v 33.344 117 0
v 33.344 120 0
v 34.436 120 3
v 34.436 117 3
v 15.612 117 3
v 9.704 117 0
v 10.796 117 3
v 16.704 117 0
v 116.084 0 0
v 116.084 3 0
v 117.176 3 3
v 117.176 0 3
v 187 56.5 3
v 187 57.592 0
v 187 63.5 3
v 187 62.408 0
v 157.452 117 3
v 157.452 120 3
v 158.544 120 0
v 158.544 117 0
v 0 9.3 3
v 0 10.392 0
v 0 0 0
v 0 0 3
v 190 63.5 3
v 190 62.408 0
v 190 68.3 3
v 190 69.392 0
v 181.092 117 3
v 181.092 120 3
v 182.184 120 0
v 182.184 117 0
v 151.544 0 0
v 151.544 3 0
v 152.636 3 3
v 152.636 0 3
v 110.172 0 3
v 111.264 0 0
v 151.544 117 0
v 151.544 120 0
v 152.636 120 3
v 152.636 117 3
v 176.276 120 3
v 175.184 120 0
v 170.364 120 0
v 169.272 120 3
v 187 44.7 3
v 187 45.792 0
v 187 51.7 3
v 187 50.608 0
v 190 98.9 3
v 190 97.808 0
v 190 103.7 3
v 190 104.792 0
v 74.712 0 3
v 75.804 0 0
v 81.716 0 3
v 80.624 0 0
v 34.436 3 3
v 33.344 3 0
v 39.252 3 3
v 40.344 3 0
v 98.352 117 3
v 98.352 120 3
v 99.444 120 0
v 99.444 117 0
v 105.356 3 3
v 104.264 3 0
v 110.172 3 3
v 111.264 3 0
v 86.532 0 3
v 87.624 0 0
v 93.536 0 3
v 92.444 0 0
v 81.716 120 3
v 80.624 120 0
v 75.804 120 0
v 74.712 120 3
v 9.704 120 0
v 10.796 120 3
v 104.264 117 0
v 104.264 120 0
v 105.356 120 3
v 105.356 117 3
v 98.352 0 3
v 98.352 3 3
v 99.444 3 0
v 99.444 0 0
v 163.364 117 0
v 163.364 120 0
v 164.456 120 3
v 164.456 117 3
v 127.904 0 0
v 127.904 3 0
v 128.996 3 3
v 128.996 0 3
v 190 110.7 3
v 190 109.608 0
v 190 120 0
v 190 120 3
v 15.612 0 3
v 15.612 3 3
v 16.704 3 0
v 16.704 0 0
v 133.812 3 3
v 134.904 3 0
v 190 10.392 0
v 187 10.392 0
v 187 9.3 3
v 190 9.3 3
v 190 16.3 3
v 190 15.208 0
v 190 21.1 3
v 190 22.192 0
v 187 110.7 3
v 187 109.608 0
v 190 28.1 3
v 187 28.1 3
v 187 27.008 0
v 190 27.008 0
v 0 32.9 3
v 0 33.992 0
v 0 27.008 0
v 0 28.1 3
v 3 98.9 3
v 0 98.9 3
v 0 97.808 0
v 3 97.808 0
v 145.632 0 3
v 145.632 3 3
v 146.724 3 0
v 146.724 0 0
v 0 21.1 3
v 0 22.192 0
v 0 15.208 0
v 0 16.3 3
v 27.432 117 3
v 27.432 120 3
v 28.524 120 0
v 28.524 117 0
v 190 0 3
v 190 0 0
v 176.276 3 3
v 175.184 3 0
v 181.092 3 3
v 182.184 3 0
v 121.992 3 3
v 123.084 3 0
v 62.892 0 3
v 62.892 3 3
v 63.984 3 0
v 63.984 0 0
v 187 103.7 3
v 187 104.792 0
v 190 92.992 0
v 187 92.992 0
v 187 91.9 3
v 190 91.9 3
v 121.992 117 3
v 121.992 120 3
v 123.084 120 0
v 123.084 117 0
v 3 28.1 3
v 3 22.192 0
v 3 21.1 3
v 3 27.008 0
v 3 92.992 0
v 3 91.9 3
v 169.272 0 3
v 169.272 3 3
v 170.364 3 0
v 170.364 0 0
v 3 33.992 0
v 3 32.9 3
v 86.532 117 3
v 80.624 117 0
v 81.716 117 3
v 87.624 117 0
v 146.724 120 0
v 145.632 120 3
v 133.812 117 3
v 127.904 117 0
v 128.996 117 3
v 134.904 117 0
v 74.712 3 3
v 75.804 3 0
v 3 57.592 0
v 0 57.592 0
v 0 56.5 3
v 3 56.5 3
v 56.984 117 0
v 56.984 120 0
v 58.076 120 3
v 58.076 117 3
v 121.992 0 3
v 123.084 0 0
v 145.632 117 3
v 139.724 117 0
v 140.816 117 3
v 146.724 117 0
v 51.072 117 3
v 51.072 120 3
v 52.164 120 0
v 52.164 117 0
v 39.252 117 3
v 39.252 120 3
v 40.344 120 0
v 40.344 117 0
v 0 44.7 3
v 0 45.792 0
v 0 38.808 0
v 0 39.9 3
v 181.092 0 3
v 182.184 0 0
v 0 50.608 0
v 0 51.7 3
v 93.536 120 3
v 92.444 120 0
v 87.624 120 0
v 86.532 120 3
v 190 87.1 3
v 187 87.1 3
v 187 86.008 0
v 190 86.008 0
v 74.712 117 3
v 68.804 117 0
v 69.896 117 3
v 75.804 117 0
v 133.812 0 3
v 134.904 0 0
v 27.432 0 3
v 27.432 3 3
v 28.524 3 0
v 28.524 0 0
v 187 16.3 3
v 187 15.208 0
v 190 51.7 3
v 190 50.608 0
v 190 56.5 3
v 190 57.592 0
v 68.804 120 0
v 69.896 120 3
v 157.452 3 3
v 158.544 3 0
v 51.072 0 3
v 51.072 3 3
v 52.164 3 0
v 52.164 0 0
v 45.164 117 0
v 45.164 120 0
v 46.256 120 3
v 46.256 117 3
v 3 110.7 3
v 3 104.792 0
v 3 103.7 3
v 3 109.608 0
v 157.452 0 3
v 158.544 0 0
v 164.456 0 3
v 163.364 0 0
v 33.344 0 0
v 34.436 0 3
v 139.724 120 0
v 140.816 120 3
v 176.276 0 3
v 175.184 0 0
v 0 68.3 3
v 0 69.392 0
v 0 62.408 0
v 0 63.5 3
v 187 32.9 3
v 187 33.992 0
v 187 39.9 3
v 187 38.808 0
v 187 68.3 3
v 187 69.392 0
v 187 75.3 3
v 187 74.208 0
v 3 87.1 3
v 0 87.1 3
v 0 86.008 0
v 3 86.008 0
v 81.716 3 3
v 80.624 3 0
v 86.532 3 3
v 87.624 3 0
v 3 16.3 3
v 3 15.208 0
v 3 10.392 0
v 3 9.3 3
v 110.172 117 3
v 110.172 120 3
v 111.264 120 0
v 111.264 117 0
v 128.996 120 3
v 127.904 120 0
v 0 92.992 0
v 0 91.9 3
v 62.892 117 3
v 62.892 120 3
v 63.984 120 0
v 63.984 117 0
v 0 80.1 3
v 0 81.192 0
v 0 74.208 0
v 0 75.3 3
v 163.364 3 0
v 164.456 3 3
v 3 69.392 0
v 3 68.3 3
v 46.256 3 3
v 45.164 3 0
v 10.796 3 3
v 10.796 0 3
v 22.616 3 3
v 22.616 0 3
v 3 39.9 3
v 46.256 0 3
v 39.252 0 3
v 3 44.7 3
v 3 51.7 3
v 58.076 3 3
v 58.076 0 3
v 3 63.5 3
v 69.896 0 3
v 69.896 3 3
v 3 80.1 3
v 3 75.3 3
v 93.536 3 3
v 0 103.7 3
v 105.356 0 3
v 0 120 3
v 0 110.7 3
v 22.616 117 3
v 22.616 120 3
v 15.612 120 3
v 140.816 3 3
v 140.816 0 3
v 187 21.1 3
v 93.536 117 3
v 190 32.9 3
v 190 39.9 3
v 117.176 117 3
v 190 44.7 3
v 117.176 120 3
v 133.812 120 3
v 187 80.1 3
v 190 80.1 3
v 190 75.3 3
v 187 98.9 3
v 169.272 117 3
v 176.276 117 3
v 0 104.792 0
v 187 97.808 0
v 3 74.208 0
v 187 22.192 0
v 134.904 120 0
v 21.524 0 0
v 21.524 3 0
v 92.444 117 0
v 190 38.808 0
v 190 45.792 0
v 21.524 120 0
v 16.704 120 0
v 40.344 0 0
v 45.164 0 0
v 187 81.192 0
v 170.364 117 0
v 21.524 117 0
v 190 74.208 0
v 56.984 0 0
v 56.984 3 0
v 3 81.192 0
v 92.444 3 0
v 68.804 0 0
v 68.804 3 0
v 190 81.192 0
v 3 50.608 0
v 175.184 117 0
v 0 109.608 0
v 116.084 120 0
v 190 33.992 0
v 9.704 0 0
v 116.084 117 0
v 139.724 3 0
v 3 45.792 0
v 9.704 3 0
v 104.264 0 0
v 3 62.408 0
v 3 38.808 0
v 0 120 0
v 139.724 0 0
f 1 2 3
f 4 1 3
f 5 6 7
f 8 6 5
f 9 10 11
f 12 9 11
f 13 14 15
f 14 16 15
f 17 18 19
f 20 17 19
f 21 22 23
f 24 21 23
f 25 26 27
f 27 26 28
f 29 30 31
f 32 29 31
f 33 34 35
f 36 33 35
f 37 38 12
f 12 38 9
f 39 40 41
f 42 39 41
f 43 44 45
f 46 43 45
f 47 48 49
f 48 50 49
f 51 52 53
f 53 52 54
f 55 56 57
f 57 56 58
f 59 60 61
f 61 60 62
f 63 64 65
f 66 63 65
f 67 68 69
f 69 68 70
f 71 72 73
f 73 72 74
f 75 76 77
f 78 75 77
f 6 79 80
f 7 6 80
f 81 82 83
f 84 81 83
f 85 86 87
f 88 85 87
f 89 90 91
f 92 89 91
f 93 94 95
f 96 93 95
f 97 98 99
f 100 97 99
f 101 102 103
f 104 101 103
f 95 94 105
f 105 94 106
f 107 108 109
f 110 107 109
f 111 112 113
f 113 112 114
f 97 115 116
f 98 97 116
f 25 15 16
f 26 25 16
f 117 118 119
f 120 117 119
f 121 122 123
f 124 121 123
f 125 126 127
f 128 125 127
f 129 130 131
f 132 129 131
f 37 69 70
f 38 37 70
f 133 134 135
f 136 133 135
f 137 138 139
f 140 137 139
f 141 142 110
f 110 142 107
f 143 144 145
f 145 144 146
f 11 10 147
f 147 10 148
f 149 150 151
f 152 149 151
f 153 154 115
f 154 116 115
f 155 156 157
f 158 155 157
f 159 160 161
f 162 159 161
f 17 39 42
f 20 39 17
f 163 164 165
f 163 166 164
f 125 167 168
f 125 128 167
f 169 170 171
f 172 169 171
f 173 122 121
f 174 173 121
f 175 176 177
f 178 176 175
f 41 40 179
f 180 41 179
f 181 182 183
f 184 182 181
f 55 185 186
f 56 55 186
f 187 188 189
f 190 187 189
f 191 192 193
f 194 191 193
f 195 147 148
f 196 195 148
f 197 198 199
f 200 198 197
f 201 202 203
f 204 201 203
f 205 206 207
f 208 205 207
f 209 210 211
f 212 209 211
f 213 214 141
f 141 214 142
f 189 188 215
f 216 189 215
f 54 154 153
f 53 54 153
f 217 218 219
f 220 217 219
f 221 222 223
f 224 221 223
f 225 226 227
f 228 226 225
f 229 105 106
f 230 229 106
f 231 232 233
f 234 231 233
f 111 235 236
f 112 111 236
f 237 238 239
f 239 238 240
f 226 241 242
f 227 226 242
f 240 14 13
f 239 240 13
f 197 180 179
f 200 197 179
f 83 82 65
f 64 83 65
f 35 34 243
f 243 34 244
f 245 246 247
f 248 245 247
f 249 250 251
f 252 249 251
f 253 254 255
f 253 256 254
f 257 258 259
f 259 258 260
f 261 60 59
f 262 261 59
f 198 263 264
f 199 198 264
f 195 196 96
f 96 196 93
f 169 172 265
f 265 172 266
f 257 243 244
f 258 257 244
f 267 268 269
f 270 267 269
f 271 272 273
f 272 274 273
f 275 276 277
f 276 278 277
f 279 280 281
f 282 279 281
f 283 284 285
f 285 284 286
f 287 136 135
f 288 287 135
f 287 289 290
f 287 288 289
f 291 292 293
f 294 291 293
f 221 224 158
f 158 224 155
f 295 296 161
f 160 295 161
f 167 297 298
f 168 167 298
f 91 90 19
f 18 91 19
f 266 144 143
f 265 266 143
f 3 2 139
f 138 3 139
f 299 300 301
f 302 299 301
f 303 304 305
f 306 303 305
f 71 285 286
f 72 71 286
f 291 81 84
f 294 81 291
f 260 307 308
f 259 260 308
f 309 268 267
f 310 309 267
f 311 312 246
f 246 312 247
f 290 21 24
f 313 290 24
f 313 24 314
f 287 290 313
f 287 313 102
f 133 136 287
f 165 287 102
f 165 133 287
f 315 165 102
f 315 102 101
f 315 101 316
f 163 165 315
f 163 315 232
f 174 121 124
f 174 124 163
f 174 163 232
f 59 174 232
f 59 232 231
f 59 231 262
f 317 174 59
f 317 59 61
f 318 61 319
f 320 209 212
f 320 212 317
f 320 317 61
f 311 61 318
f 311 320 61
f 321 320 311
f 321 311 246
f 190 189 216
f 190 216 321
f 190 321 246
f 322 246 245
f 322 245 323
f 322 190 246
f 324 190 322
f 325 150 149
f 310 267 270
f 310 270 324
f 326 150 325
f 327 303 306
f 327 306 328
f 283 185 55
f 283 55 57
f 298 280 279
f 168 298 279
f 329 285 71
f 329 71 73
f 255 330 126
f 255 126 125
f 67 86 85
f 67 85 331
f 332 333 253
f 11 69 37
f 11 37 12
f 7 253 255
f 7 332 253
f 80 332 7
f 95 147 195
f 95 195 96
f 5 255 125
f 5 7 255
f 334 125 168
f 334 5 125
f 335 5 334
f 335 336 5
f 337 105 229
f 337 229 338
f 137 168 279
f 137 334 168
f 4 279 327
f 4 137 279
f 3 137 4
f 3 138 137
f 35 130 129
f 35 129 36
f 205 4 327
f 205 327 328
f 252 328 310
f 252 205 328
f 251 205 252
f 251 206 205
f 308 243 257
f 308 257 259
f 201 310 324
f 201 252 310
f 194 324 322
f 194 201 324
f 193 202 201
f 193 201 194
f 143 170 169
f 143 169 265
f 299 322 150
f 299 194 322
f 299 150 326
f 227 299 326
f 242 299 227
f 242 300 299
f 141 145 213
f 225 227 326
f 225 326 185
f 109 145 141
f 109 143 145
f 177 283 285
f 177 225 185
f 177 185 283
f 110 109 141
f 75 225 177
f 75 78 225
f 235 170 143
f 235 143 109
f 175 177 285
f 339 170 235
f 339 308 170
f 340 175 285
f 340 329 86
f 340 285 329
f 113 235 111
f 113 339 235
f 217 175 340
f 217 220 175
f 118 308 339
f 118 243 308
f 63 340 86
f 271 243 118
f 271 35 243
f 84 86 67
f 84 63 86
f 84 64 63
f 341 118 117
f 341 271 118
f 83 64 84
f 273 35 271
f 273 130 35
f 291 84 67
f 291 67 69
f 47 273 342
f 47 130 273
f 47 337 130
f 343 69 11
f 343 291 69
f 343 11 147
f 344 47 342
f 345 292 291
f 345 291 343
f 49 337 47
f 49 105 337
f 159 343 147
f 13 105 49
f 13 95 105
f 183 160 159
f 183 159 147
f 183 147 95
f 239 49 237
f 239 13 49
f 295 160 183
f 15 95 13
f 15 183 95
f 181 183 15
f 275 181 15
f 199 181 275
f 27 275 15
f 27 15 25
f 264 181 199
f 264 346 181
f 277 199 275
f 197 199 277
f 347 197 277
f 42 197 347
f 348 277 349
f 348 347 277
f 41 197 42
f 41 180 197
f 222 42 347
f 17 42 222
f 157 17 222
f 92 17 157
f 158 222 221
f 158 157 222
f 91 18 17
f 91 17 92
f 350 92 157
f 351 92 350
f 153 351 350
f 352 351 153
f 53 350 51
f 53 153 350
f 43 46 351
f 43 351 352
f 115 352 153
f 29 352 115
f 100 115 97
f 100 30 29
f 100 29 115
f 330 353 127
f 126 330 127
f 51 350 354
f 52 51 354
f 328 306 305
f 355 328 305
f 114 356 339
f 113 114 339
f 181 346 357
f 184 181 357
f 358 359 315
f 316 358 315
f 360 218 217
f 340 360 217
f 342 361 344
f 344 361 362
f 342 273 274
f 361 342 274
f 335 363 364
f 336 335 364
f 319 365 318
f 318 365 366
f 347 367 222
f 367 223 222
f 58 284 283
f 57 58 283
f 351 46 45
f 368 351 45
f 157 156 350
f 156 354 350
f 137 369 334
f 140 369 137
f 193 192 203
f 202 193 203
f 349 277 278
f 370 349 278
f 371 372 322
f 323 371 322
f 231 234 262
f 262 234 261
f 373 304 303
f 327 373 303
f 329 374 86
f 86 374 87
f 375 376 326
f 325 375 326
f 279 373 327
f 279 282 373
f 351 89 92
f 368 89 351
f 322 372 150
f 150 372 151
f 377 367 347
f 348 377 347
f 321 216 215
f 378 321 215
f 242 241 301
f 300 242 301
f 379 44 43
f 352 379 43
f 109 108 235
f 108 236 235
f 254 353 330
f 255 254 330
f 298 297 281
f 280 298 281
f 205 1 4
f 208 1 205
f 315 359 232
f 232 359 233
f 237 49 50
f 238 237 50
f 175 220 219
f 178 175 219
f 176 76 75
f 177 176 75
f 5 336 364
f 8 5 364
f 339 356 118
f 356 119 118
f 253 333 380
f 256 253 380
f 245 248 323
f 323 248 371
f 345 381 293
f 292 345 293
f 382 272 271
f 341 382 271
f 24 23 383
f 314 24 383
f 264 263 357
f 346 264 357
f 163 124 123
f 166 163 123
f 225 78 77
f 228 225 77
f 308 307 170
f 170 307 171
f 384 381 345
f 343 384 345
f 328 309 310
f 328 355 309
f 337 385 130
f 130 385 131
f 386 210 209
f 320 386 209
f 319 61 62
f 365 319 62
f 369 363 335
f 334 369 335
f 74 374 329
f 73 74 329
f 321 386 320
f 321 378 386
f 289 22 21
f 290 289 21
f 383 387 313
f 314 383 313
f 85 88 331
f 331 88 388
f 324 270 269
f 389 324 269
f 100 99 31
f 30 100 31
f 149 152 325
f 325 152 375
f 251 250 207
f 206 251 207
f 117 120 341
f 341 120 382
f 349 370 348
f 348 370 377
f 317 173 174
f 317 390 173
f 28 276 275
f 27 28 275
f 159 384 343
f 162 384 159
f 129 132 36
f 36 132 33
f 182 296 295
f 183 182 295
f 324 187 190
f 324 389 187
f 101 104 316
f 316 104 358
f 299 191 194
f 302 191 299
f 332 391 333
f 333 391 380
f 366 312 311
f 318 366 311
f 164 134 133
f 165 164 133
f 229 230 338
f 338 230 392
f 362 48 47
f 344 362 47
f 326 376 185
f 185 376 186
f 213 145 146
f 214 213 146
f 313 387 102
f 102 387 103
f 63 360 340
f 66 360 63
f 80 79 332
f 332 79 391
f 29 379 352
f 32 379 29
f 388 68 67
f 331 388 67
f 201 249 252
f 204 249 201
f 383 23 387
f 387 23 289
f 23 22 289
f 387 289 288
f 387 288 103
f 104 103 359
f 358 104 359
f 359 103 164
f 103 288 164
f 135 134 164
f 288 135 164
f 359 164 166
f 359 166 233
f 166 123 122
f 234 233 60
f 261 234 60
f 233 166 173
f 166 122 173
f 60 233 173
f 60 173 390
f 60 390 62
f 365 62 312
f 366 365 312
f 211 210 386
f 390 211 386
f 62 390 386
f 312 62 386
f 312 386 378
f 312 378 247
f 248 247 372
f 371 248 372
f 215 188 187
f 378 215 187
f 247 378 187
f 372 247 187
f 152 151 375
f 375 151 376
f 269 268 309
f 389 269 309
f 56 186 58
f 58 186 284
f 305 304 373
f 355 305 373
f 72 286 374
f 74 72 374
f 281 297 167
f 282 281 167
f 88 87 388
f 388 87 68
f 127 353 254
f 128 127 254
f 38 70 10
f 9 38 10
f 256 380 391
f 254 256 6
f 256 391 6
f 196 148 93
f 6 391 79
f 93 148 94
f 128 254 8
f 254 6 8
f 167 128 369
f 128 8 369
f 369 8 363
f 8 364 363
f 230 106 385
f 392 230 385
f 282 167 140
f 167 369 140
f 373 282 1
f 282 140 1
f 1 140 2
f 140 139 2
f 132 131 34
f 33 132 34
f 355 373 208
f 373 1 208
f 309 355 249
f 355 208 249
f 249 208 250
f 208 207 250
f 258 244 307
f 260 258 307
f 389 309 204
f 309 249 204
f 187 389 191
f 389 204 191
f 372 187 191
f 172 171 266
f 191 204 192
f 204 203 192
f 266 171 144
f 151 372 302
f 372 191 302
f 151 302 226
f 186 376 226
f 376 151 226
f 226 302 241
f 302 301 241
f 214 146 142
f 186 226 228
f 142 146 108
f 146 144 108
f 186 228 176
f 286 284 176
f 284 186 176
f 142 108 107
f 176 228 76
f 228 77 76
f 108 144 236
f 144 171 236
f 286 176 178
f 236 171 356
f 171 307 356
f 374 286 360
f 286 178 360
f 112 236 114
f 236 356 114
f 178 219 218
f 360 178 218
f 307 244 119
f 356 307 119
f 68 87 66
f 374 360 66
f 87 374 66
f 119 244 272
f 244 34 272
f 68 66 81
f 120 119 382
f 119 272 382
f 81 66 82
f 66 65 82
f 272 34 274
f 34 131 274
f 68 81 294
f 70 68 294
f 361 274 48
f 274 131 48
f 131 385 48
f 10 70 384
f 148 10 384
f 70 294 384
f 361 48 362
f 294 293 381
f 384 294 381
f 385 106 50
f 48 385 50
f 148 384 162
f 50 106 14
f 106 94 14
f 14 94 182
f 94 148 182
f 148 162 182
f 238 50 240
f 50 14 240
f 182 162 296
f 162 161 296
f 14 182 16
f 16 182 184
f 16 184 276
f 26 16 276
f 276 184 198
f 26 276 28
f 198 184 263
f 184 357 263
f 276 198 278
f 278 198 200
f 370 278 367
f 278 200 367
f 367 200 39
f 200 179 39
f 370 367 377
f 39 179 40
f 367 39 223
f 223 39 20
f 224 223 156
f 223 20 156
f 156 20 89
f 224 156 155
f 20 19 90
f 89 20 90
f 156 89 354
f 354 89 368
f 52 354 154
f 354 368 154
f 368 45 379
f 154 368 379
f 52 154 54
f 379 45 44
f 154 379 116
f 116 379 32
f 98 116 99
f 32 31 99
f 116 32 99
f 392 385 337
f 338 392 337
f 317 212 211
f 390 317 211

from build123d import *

# Parameters (mm, degrees)
BOSS_EXTRUDE1_DEPTH = 3
CUT_EXTRUDE1_DEPTH  = 3
CUT_EXTRUDE3_START  = -117
CUT_EXTRUDE3_DEPTH  = 187
CUT_EXTRUDE5_DEPTH  = 3
CUT_EXTRUDE6_START  = -187
CUT_EXTRUDE6_DEPTH  = 3


with BuildPart() as part:
    # Sketch1 → Boss-Extrude1 (new body)
    with BuildSketch(Plane.XY):
        Polygon((10, 0), (190, 0), (190, 120), (9.862497021, 120), (0, 120), (0, 0), align=None)
    extrude(amount=BOSS_EXTRUDE1_DEPTH)

    # Sketch3 → Cut-Extrude1 (cut)
    with BuildSketch(Plane(origin=(0, 120, 0), x_dir=(1, 0, 0), z_dir=(0, 1, 0))):
        Polygon((181.0916961, -3), (182.183607, 0), (175.183607, 0), (176.275517, -3), align=None)
        Polygon((169.2716961, -3), (170.363607, 0), (163.363607, 0), (164.455517, -3), align=None)
        Polygon((157.4516961, -3), (158.543607, 0), (151.543607, 0), (152.635517, -3), align=None)
        Polygon((145.6316961, -3), (146.723607, 0), (139.723607, 0), (140.815517, -3), align=None)
        Polygon((133.8116961, -3), (134.903607, 0), (127.903607, 0), (128.995517, -3), align=None)
        Polygon((121.9916961, -3), (123.083607, 0), (116.083607, 0), (117.175517, -3), align=None)
        Polygon((110.1716961, -3), (111.263607, 0), (104.263607, 0), (105.355517, -3), align=None)
        Polygon((98.3516961, -3), (99.443607, 0), (92.443607, 0), (93.535517, -3), align=None)
        Polygon((86.5316961, -3), (87.623607, 0), (80.623607, 0), (81.715517, -3), align=None)
        Polygon((74.7116961, -3), (75.803607, 0), (68.803607, 0), (69.895517, -3), align=None)
        Polygon((62.8916961, -3), (63.983607, 0), (56.983607, 0), (58.075517, -3), align=None)
        Polygon((51.0716961, -3), (52.163607, 0), (45.163607, 0), (46.255517, -3), align=None)
        Polygon((39.2516961, -3), (40.343607, 0), (33.343607, 0), (34.435517, -3), align=None)
        Polygon((27.4316961, -3), (28.523607, 0), (21.523607, 0), (22.615517, -3), align=None)
        Polygon((15.6116961, -3), (16.703607, 0), (9.703607, 0), (10.795517, -3), align=None)
        Polygon((232.620596447, -14.855202406), (233.712507347, -11.855202406), (226.712507347, -11.855202406), (227.804417347, -14.855202406), align=None)
    extrude(amount=-CUT_EXTRUDE1_DEPTH, mode=Mode.SUBTRACT)

    # Sketch3<2> → Cut-Extrude3 (cut)
    with BuildSketch(Plane(origin=(0, 120, 0), x_dir=(1, 0, 0), z_dir=(0, 1, 0)).offset(CUT_EXTRUDE3_START)):
        Polygon((181.0916961, -3), (182.183607, 0), (175.183607, 0), (176.275517, -3), align=None)
        Polygon((169.2716961, -3), (170.363607, 0), (163.363607, 0), (164.455517, -3), align=None)
        Polygon((157.4516961, -3), (158.543607, 0), (151.543607, 0), (152.635517, -3), align=None)
        Polygon((145.6316961, -3), (146.723607, 0), (139.723607, 0), (140.815517, -3), align=None)
        Polygon((133.8116961, -3), (134.903607, 0), (127.903607, 0), (128.995517, -3), align=None)
        Polygon((121.9916961, -3), (123.083607, 0), (116.083607, 0), (117.175517, -3), align=None)
        Polygon((110.1716961, -3), (111.263607, 0), (104.263607, 0), (105.355517, -3), align=None)
        Polygon((98.3516961, -3), (99.443607, 0), (92.443607, 0), (93.535517, -3), align=None)
        Polygon((86.5316961, -3), (87.623607, 0), (80.623607, 0), (81.715517, -3), align=None)
        Polygon((74.7116961, -3), (75.803607, 0), (68.803607, 0), (69.895517, -3), align=None)
        Polygon((62.8916961, -3), (63.983607, 0), (56.983607, 0), (58.075517, -3), align=None)
        Polygon((51.0716961, -3), (52.163607, 0), (45.163607, 0), (46.255517, -3), align=None)
        Polygon((39.2516961, -3), (40.343607, 0), (33.343607, 0), (34.435517, -3), align=None)
        Polygon((27.4316961, -3), (28.523607, 0), (21.523607, 0), (22.615517, -3), align=None)
        Polygon((15.6116961, -3), (16.703607, 0), (9.703607, 0), (10.795517, -3), align=None)
        Polygon((232.620596447, -14.855202406), (233.712507347, -11.855202406), (226.712507347, -11.855202406), (227.804417347, -14.855202406), align=None)
    extrude(amount=-CUT_EXTRUDE3_DEPTH, mode=Mode.SUBTRACT)

    # Sketch6 → Cut-Extrude5 (cut)
    with BuildSketch(Plane.ZY):
        Polygon((0, 104.7919109), (3, 103.7), (3, 110.7), (0, 109.60809), align=None)
        Polygon((0, 92.9919109), (3, 91.9), (3, 98.9), (0, 97.80809), align=None)
        Polygon((0, 81.1919109), (3, 80.1), (3, 87.1), (0, 86.00809), align=None)
        Polygon((0, 69.3919109), (3, 68.3), (3, 75.3), (0, 74.20809), align=None)
        Polygon((0, 57.5919109), (3, 56.5), (3, 63.5), (0, 62.40809), align=None)
        Polygon((0, 45.7919109), (3, 44.7), (3, 51.7), (0, 50.60809), align=None)
        Polygon((0, 33.9919109), (3, 32.9), (3, 39.9), (0, 38.80809), align=None)
        Polygon((0, 22.1919109), (3, 21.1), (3, 28.1), (0, 27.00809), align=None)
        Polygon((0, 10.3919109), (3, 9.3), (3, 16.3), (0, 15.20809), align=None)
    extrude(amount=-CUT_EXTRUDE5_DEPTH, mode=Mode.SUBTRACT)

    # Sketch6<3> → Cut-Extrude6 (cut)
    with BuildSketch(Plane.ZY.offset(CUT_EXTRUDE6_START)):
        Polygon((0, 104.7919109), (3, 103.7), (3, 110.7), (0, 109.60809), align=None)
        Polygon((0, 92.9919109), (3, 91.9), (3, 98.9), (0, 97.80809), align=None)
        Polygon((0, 81.1919109), (3, 80.1), (3, 87.1), (0, 86.00809), align=None)
        Polygon((0, 69.3919109), (3, 68.3), (3, 75.3), (0, 74.20809), align=None)
        Polygon((0, 57.5919109), (3, 56.5), (3, 63.5), (0, 62.40809), align=None)
        Polygon((0, 45.7919109), (3, 44.7), (3, 51.7), (0, 50.60809), align=None)
        Polygon((0, 33.9919109), (3, 32.9), (3, 39.9), (0, 38.80809), align=None)
        Polygon((0, 22.1919109), (3, 21.1), (3, 28.1), (0, 27.00809), align=None)
        Polygon((0, 10.3919109), (3, 9.3), (3, 16.3), (0, 15.20809), align=None)
    extrude(amount=-CUT_EXTRUDE6_DEPTH, mode=Mode.SUBTRACT)


solid = part.part
